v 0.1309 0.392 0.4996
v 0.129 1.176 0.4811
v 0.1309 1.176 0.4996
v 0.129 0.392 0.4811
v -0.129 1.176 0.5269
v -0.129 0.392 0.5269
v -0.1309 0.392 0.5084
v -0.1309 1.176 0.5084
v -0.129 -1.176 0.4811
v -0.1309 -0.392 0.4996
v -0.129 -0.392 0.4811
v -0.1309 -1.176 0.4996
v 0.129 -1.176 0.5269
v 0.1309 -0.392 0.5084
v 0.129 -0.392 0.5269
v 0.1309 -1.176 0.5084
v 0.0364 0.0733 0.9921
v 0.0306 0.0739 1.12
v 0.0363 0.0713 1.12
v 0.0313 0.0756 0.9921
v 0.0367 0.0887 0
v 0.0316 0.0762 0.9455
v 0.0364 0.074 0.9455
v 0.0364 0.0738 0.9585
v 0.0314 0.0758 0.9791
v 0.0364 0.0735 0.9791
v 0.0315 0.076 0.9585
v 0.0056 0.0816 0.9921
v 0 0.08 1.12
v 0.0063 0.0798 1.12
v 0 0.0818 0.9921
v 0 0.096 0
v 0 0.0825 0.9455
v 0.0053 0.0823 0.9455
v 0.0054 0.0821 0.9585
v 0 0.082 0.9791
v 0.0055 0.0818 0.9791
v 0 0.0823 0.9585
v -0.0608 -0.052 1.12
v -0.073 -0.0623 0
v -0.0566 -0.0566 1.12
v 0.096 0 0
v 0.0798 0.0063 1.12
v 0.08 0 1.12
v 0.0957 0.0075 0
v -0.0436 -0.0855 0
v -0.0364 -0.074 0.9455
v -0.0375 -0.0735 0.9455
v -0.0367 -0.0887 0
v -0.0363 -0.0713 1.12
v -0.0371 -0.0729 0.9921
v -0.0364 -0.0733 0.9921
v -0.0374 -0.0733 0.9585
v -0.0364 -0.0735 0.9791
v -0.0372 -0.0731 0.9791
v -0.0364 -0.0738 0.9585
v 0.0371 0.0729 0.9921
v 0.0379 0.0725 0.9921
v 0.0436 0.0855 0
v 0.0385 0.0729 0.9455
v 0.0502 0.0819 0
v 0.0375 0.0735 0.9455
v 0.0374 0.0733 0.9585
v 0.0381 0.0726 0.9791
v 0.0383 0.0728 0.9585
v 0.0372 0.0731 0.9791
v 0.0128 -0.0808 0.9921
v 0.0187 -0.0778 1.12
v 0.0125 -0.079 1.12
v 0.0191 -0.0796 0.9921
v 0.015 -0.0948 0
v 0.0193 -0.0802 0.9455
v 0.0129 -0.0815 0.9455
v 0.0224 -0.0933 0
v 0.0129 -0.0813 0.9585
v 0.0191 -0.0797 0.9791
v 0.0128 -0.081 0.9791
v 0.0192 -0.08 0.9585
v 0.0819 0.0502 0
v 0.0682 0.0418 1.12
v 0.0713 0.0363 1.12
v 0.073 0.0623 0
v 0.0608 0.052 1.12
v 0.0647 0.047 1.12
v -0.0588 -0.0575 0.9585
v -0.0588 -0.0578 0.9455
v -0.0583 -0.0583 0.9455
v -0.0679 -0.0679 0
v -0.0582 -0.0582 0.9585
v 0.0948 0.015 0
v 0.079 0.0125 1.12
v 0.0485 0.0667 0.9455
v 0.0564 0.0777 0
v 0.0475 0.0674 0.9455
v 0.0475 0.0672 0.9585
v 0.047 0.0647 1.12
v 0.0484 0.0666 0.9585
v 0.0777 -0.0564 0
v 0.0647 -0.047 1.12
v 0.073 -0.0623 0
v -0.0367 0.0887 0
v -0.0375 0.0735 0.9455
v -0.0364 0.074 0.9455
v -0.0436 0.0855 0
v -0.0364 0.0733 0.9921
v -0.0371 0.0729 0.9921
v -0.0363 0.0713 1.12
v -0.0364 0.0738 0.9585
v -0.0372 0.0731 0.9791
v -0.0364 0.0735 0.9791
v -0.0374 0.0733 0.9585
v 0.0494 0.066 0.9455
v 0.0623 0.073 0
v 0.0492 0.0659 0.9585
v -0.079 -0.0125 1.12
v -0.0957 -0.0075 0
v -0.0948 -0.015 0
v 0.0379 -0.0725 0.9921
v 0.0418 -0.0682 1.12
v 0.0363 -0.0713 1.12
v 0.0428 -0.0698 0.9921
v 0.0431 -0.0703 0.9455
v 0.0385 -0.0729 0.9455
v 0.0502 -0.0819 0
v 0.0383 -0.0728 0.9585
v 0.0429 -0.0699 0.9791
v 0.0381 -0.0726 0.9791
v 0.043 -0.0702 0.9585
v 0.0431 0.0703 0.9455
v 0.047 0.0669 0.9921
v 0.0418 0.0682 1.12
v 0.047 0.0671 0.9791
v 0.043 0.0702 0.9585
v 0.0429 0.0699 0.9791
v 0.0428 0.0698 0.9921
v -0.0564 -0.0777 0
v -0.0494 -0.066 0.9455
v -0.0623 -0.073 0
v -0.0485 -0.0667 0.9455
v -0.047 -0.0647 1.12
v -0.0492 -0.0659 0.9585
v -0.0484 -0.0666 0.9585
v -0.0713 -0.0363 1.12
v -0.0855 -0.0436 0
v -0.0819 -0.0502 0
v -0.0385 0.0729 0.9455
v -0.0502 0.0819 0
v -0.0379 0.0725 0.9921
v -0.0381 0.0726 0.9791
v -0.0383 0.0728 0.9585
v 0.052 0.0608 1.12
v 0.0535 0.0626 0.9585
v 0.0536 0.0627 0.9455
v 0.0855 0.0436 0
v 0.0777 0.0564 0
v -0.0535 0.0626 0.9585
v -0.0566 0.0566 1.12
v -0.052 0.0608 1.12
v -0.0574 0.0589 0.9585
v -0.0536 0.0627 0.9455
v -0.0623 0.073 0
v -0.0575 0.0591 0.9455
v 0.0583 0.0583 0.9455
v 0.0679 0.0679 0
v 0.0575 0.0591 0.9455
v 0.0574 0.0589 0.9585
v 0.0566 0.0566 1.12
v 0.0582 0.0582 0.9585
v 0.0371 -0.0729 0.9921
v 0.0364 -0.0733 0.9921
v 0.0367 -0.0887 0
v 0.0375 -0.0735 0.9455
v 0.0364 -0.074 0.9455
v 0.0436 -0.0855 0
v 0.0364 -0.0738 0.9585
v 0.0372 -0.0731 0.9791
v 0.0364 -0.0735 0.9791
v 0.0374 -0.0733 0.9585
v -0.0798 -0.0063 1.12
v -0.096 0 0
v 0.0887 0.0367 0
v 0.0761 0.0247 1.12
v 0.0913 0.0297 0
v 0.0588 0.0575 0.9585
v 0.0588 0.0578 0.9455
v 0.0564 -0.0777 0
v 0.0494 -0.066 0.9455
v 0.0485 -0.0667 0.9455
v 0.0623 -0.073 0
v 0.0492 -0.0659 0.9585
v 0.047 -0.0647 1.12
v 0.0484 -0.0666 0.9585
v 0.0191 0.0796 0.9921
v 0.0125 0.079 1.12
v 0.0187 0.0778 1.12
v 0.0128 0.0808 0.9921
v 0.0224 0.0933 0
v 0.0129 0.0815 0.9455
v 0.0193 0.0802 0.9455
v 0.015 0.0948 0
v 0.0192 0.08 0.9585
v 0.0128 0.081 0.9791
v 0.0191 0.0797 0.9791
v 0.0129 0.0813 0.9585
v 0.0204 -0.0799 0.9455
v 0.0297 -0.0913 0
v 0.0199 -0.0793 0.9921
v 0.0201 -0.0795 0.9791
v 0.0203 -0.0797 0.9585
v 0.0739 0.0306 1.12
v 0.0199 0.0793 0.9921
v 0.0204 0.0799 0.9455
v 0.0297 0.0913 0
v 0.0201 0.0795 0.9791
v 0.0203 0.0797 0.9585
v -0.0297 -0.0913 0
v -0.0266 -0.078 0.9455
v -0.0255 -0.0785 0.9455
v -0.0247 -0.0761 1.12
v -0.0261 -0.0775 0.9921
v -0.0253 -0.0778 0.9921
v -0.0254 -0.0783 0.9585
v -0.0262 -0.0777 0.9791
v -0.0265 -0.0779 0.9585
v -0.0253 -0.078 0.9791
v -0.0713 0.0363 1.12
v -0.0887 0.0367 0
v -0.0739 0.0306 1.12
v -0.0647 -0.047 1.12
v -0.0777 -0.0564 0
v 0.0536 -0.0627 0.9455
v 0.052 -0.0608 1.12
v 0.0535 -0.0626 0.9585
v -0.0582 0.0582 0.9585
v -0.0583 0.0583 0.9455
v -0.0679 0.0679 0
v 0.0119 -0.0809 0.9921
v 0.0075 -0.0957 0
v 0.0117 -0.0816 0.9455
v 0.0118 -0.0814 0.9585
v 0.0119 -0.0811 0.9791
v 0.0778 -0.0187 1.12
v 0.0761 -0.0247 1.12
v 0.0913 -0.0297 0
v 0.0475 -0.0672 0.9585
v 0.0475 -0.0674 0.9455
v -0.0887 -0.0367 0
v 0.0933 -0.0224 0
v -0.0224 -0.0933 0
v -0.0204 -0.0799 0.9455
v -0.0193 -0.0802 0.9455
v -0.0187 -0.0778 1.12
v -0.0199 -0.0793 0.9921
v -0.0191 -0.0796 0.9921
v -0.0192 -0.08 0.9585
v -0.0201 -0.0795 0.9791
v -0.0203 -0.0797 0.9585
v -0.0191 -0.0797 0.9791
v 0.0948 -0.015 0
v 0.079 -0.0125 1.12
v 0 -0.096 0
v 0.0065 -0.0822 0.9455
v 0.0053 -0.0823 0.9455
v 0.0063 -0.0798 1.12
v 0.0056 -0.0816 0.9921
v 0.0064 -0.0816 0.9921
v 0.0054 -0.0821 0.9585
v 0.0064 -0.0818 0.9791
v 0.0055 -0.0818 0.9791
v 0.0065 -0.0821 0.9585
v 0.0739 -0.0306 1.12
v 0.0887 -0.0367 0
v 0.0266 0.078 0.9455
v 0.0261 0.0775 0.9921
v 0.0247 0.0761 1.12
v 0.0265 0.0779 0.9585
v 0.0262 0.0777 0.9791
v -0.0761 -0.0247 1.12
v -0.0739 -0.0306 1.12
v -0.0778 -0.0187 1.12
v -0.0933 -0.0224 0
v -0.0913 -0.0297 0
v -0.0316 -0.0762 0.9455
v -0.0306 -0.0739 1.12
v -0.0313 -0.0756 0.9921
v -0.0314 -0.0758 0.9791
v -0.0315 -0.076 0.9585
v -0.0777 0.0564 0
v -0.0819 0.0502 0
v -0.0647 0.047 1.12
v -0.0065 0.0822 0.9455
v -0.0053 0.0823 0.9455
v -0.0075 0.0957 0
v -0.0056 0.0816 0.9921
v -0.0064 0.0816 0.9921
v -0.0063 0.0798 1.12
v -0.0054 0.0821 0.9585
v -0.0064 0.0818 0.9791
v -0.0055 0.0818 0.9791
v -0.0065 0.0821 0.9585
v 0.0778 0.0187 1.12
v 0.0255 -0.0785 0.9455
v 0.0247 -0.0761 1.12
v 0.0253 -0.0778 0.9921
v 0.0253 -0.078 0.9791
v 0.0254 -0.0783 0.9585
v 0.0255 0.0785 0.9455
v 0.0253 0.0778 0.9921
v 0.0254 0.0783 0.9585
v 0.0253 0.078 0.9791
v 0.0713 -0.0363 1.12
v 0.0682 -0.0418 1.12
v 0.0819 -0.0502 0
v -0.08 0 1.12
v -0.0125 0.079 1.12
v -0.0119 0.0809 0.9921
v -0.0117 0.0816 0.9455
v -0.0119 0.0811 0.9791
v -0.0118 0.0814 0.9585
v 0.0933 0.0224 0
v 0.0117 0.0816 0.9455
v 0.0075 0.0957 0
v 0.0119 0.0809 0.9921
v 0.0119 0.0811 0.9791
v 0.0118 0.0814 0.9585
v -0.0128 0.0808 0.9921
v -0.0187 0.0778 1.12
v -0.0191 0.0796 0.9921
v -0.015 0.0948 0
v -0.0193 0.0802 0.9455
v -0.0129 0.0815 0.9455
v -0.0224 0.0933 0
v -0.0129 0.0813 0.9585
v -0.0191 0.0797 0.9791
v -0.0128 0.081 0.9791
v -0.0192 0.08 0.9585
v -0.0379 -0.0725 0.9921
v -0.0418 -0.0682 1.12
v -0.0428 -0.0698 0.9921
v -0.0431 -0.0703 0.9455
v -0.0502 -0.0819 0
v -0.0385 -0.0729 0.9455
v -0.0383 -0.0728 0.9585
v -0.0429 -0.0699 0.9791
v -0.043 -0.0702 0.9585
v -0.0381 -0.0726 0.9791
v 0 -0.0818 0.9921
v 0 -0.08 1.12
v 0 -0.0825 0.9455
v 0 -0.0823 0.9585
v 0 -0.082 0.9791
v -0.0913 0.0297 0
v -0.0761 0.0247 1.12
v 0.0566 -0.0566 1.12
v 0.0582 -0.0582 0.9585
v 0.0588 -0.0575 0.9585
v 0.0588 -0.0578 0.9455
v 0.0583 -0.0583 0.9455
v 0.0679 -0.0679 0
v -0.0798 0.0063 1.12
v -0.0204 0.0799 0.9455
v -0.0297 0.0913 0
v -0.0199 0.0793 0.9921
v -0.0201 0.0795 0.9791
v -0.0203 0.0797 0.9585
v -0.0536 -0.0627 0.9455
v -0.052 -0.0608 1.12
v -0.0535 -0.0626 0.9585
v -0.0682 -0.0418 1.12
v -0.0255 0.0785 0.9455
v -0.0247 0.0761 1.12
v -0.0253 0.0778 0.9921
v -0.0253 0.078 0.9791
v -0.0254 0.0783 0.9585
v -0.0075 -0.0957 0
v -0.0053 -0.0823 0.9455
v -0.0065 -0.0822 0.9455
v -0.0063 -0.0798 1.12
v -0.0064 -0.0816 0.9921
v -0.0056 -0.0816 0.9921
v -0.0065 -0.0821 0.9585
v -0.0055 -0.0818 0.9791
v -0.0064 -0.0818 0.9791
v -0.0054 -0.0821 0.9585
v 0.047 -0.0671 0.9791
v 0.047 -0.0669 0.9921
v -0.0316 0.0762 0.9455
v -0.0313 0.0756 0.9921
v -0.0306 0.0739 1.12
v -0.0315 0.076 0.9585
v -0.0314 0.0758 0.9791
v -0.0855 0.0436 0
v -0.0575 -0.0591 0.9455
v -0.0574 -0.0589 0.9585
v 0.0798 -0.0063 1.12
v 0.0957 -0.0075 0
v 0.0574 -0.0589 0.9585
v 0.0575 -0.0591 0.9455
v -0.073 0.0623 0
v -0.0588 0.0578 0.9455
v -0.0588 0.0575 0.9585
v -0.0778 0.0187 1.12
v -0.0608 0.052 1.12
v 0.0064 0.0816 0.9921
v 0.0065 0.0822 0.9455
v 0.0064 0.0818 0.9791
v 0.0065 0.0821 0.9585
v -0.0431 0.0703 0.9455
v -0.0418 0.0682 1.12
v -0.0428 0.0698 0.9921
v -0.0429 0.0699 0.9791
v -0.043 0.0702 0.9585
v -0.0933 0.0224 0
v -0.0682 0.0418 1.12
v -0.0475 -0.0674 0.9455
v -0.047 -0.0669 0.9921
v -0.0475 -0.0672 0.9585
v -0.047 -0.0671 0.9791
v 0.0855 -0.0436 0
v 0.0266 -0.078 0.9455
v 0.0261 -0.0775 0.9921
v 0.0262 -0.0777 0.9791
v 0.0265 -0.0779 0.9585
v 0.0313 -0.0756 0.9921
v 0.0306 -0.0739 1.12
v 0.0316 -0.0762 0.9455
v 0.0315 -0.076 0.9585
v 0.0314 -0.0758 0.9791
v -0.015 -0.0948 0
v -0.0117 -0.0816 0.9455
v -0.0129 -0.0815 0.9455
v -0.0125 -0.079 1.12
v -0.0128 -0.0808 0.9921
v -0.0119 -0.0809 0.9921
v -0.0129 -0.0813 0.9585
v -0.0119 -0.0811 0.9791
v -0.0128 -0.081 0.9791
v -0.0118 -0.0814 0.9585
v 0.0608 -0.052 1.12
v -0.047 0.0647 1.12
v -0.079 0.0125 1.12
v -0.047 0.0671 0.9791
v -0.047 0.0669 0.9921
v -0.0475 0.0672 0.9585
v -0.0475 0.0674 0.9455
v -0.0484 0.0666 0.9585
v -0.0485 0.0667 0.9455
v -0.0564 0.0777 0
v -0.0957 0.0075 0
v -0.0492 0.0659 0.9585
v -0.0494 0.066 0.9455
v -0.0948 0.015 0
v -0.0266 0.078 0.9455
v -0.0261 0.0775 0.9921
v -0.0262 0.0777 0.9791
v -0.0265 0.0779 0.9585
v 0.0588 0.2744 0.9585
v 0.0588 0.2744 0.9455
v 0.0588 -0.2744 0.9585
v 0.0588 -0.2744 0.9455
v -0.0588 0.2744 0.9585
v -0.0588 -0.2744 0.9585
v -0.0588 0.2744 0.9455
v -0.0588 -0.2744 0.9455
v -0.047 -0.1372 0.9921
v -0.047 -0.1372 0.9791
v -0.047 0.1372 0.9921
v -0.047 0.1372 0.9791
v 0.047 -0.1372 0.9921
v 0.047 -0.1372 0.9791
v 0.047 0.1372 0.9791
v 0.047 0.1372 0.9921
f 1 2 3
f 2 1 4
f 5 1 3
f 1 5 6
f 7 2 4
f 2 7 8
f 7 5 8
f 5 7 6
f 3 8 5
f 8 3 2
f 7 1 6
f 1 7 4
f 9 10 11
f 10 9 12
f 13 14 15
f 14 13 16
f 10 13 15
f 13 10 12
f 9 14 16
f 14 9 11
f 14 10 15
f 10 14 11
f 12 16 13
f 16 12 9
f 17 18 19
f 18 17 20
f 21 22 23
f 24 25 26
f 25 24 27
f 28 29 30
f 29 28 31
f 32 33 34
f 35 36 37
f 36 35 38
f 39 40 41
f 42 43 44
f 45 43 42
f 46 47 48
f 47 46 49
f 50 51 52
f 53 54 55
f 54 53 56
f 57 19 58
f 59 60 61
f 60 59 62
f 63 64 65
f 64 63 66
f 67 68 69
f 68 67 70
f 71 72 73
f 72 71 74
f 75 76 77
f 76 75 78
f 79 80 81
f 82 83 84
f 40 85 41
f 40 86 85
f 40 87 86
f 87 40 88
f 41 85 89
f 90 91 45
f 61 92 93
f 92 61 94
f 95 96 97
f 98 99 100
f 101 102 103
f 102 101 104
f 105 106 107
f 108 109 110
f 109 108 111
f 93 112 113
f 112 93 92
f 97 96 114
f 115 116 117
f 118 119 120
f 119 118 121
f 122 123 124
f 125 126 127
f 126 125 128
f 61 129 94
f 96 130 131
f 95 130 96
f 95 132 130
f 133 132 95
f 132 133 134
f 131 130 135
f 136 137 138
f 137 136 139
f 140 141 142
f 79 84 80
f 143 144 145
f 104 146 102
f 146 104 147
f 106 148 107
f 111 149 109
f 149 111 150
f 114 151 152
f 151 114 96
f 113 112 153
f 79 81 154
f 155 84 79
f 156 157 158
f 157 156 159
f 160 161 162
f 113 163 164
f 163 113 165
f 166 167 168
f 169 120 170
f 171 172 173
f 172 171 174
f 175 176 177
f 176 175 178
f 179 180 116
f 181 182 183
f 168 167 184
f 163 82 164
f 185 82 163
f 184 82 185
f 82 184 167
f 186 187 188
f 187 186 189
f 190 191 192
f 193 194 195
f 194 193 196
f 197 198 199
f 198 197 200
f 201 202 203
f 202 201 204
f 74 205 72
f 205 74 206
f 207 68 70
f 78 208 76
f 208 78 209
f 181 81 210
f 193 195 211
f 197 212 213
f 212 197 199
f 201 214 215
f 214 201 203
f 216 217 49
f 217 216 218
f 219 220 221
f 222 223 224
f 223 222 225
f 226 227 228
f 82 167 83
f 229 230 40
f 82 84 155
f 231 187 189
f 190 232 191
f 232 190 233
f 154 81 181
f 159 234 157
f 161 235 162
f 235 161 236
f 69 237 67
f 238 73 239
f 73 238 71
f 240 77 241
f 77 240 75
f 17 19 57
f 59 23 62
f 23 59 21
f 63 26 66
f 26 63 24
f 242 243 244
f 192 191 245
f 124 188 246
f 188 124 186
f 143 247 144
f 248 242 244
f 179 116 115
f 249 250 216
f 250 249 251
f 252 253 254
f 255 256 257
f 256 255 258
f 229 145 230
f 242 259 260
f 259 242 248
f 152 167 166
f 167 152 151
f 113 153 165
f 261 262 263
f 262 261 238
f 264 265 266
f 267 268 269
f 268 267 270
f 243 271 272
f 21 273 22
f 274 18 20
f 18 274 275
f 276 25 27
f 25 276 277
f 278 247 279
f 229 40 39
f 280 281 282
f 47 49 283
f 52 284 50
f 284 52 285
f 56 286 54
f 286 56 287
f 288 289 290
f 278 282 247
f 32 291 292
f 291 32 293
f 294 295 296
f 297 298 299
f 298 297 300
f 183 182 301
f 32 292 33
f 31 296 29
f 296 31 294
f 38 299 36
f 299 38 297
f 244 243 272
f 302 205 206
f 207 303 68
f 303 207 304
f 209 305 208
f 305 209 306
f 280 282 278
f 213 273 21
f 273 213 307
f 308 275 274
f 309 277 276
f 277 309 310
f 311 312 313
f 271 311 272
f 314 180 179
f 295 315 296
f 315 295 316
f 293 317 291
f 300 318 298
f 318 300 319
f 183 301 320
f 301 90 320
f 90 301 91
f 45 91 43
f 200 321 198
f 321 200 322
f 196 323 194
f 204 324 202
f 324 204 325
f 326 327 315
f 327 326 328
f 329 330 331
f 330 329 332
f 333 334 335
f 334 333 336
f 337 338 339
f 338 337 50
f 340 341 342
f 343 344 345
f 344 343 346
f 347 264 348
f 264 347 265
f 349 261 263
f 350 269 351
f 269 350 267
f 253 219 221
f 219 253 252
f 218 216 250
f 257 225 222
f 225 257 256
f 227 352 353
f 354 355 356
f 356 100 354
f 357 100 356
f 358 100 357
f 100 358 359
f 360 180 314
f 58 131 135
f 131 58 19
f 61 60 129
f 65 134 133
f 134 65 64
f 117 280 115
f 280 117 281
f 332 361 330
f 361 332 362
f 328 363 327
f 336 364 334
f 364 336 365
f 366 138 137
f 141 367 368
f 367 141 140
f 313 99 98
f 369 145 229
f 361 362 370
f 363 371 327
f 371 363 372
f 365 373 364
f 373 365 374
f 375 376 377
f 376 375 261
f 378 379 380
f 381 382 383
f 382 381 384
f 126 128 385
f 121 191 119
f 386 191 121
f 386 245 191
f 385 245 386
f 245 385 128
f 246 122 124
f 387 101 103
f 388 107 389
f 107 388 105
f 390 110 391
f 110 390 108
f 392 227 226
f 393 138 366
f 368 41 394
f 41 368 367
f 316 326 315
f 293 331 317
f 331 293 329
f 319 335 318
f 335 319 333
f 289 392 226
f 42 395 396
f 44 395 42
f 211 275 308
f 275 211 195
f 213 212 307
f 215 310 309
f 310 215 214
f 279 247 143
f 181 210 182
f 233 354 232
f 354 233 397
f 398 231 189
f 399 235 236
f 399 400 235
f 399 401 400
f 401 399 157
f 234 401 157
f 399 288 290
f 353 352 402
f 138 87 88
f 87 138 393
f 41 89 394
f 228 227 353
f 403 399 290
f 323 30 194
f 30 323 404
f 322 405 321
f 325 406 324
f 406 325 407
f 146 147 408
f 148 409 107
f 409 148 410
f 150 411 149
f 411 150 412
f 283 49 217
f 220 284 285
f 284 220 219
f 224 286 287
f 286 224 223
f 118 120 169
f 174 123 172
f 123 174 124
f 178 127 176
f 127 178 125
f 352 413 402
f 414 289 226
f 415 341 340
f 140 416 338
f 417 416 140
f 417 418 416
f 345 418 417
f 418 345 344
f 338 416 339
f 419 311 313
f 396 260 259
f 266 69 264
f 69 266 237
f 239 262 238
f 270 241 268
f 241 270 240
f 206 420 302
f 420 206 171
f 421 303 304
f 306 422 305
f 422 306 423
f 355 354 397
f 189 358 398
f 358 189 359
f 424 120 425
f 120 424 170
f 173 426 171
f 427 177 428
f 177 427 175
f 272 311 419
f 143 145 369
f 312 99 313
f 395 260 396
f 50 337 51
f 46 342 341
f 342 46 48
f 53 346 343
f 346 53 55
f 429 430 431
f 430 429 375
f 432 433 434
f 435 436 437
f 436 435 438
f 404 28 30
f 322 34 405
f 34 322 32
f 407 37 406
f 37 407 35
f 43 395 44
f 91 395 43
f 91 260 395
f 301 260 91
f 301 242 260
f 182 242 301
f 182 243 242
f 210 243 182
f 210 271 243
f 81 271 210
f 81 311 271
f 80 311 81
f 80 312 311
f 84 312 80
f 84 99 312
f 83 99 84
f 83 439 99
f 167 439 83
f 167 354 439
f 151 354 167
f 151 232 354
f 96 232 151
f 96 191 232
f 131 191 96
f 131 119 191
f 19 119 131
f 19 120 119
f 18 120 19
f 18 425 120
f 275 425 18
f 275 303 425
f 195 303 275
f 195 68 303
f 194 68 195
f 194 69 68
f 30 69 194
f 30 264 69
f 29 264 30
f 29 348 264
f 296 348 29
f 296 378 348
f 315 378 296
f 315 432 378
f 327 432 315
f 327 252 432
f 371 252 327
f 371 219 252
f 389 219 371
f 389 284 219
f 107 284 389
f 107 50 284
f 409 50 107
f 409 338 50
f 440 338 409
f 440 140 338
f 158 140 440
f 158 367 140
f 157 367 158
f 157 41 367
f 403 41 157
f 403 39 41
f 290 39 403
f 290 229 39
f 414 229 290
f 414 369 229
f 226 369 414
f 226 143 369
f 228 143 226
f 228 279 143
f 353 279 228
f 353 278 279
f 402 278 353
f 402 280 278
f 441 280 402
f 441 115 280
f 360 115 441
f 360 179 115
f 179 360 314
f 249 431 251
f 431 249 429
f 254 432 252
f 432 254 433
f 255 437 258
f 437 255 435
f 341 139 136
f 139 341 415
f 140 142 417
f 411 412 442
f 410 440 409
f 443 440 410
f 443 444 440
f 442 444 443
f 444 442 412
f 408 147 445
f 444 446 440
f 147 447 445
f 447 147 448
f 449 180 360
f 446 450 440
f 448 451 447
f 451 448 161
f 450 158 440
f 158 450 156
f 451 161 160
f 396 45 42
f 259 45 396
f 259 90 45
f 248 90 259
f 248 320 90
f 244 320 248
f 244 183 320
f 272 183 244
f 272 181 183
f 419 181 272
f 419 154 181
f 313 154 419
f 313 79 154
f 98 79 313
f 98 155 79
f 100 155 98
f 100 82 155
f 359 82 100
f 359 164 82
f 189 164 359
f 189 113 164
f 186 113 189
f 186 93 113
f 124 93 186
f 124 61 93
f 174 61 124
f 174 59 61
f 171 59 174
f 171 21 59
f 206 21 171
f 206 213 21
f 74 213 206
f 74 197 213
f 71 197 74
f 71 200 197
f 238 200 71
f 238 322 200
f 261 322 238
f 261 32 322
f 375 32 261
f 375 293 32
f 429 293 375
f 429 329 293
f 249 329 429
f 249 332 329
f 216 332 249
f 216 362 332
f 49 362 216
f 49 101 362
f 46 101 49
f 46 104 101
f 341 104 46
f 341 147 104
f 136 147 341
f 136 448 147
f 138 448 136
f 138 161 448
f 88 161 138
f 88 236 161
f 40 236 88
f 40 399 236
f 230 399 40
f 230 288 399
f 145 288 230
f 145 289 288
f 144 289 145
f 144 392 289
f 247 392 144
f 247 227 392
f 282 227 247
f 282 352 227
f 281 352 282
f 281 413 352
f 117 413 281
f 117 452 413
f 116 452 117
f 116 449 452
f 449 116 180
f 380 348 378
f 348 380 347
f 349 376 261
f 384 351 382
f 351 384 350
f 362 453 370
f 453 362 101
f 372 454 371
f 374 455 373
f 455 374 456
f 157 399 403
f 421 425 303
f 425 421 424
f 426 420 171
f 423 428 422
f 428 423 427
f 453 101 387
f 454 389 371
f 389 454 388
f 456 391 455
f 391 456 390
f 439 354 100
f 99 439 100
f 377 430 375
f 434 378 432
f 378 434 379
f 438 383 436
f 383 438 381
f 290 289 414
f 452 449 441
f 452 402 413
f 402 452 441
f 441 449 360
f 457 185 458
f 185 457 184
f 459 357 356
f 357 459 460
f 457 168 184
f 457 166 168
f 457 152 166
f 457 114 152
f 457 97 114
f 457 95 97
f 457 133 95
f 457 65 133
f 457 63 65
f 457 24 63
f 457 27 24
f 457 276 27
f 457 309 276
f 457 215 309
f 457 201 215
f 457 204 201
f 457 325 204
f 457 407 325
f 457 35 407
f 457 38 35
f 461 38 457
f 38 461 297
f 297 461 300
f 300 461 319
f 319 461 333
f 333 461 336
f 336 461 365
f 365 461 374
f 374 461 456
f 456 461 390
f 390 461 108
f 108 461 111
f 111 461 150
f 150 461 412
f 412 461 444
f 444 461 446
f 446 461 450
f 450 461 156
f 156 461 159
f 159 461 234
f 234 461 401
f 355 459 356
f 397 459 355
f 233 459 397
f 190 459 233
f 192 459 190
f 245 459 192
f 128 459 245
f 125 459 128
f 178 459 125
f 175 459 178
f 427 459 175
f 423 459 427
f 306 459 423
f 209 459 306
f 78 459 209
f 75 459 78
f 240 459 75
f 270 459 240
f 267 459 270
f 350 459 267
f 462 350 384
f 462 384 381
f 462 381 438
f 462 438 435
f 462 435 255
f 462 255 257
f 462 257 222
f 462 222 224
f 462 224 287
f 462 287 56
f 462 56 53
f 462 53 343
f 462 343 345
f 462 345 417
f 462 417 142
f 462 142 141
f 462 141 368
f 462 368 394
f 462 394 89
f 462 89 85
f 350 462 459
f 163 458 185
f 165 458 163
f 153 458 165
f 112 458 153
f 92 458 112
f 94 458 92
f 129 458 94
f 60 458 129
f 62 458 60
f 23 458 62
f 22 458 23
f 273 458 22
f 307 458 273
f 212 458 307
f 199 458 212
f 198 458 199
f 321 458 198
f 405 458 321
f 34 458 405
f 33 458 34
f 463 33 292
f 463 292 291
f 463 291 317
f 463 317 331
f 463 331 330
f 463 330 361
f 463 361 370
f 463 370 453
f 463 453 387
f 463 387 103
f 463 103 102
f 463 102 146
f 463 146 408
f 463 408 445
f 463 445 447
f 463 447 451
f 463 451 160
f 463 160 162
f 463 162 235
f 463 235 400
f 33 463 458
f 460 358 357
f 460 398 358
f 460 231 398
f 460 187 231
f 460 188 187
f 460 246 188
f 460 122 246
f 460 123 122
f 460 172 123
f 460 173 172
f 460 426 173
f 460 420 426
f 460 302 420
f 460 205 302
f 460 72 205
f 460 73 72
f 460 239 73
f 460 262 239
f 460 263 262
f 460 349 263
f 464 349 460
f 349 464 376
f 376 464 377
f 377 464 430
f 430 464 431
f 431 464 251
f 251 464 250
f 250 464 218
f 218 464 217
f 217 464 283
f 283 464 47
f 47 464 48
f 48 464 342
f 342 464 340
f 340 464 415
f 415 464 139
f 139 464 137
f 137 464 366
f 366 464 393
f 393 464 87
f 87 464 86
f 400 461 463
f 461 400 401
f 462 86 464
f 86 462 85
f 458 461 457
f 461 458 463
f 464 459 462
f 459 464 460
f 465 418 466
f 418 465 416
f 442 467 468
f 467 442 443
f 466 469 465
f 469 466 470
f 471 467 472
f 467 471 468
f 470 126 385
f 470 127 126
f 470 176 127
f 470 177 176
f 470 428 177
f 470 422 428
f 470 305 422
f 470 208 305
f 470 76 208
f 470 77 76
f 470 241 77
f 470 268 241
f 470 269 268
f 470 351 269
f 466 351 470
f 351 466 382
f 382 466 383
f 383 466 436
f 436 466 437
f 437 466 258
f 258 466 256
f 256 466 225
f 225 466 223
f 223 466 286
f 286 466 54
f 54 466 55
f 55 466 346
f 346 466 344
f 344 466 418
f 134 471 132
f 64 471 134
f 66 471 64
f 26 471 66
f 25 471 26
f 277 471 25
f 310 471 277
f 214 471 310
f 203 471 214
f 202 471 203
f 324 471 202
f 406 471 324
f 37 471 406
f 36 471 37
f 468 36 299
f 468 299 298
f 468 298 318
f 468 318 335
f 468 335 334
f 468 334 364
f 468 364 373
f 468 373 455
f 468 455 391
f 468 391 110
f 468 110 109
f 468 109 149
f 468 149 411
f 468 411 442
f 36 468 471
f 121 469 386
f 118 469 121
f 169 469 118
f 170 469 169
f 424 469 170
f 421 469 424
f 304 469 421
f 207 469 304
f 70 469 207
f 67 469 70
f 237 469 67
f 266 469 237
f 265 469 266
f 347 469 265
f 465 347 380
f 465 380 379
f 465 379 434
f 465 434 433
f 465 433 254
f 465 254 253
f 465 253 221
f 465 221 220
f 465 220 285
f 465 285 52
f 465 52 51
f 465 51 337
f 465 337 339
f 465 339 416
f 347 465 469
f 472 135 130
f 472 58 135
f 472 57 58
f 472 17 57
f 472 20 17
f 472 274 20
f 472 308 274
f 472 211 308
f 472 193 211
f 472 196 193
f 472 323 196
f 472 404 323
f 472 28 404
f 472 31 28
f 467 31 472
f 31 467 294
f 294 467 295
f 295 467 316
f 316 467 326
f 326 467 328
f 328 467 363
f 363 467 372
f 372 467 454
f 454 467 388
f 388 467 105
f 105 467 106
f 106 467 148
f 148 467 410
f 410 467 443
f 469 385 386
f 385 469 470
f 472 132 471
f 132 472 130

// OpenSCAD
// ================================
// GENERATED AERODYNAMIC AIRCRAFT
// ================================

$fn = 80;

// --------- FUSELAGE ----------
module fuselage() {
    scale([1, 1, 1])
        cylinder(h=1.12,
                 r1=0.096,
                 r2=0.08,
                 center=false);
}

// --------- WING ----------
module wing_half(sign=1) {
    rotate([0, 6*sign, 0])
    translate([0, sign*0.784, 0])
    cube([0.26133333333333336,
          0.784,
          0.018666666666666668],
          center=true);
}

module wing() {
    wing_half(1);
    wing_half(-1);
}

// --------- TAIL ----------
module tail() {
    translate([0, 0, 0.9520000000000001])
    cube([0.11760000000000001,
          0.5488,
          0.013066666666666667],
          center=true);
}

module vertical_tail() {
    translate([0, 0, 0.9856000000000001])
    rotate([90,0,0])
    cube([0.09408000000000001,
          0.013066666666666667,
          0.2744],
          center=true);
}

// --------- ASSEMBLY ----------
union() {
    fuselage();
    translate([0,0,0.5040000000000001]) wing();
    tail();
    vertical_tail();
}
